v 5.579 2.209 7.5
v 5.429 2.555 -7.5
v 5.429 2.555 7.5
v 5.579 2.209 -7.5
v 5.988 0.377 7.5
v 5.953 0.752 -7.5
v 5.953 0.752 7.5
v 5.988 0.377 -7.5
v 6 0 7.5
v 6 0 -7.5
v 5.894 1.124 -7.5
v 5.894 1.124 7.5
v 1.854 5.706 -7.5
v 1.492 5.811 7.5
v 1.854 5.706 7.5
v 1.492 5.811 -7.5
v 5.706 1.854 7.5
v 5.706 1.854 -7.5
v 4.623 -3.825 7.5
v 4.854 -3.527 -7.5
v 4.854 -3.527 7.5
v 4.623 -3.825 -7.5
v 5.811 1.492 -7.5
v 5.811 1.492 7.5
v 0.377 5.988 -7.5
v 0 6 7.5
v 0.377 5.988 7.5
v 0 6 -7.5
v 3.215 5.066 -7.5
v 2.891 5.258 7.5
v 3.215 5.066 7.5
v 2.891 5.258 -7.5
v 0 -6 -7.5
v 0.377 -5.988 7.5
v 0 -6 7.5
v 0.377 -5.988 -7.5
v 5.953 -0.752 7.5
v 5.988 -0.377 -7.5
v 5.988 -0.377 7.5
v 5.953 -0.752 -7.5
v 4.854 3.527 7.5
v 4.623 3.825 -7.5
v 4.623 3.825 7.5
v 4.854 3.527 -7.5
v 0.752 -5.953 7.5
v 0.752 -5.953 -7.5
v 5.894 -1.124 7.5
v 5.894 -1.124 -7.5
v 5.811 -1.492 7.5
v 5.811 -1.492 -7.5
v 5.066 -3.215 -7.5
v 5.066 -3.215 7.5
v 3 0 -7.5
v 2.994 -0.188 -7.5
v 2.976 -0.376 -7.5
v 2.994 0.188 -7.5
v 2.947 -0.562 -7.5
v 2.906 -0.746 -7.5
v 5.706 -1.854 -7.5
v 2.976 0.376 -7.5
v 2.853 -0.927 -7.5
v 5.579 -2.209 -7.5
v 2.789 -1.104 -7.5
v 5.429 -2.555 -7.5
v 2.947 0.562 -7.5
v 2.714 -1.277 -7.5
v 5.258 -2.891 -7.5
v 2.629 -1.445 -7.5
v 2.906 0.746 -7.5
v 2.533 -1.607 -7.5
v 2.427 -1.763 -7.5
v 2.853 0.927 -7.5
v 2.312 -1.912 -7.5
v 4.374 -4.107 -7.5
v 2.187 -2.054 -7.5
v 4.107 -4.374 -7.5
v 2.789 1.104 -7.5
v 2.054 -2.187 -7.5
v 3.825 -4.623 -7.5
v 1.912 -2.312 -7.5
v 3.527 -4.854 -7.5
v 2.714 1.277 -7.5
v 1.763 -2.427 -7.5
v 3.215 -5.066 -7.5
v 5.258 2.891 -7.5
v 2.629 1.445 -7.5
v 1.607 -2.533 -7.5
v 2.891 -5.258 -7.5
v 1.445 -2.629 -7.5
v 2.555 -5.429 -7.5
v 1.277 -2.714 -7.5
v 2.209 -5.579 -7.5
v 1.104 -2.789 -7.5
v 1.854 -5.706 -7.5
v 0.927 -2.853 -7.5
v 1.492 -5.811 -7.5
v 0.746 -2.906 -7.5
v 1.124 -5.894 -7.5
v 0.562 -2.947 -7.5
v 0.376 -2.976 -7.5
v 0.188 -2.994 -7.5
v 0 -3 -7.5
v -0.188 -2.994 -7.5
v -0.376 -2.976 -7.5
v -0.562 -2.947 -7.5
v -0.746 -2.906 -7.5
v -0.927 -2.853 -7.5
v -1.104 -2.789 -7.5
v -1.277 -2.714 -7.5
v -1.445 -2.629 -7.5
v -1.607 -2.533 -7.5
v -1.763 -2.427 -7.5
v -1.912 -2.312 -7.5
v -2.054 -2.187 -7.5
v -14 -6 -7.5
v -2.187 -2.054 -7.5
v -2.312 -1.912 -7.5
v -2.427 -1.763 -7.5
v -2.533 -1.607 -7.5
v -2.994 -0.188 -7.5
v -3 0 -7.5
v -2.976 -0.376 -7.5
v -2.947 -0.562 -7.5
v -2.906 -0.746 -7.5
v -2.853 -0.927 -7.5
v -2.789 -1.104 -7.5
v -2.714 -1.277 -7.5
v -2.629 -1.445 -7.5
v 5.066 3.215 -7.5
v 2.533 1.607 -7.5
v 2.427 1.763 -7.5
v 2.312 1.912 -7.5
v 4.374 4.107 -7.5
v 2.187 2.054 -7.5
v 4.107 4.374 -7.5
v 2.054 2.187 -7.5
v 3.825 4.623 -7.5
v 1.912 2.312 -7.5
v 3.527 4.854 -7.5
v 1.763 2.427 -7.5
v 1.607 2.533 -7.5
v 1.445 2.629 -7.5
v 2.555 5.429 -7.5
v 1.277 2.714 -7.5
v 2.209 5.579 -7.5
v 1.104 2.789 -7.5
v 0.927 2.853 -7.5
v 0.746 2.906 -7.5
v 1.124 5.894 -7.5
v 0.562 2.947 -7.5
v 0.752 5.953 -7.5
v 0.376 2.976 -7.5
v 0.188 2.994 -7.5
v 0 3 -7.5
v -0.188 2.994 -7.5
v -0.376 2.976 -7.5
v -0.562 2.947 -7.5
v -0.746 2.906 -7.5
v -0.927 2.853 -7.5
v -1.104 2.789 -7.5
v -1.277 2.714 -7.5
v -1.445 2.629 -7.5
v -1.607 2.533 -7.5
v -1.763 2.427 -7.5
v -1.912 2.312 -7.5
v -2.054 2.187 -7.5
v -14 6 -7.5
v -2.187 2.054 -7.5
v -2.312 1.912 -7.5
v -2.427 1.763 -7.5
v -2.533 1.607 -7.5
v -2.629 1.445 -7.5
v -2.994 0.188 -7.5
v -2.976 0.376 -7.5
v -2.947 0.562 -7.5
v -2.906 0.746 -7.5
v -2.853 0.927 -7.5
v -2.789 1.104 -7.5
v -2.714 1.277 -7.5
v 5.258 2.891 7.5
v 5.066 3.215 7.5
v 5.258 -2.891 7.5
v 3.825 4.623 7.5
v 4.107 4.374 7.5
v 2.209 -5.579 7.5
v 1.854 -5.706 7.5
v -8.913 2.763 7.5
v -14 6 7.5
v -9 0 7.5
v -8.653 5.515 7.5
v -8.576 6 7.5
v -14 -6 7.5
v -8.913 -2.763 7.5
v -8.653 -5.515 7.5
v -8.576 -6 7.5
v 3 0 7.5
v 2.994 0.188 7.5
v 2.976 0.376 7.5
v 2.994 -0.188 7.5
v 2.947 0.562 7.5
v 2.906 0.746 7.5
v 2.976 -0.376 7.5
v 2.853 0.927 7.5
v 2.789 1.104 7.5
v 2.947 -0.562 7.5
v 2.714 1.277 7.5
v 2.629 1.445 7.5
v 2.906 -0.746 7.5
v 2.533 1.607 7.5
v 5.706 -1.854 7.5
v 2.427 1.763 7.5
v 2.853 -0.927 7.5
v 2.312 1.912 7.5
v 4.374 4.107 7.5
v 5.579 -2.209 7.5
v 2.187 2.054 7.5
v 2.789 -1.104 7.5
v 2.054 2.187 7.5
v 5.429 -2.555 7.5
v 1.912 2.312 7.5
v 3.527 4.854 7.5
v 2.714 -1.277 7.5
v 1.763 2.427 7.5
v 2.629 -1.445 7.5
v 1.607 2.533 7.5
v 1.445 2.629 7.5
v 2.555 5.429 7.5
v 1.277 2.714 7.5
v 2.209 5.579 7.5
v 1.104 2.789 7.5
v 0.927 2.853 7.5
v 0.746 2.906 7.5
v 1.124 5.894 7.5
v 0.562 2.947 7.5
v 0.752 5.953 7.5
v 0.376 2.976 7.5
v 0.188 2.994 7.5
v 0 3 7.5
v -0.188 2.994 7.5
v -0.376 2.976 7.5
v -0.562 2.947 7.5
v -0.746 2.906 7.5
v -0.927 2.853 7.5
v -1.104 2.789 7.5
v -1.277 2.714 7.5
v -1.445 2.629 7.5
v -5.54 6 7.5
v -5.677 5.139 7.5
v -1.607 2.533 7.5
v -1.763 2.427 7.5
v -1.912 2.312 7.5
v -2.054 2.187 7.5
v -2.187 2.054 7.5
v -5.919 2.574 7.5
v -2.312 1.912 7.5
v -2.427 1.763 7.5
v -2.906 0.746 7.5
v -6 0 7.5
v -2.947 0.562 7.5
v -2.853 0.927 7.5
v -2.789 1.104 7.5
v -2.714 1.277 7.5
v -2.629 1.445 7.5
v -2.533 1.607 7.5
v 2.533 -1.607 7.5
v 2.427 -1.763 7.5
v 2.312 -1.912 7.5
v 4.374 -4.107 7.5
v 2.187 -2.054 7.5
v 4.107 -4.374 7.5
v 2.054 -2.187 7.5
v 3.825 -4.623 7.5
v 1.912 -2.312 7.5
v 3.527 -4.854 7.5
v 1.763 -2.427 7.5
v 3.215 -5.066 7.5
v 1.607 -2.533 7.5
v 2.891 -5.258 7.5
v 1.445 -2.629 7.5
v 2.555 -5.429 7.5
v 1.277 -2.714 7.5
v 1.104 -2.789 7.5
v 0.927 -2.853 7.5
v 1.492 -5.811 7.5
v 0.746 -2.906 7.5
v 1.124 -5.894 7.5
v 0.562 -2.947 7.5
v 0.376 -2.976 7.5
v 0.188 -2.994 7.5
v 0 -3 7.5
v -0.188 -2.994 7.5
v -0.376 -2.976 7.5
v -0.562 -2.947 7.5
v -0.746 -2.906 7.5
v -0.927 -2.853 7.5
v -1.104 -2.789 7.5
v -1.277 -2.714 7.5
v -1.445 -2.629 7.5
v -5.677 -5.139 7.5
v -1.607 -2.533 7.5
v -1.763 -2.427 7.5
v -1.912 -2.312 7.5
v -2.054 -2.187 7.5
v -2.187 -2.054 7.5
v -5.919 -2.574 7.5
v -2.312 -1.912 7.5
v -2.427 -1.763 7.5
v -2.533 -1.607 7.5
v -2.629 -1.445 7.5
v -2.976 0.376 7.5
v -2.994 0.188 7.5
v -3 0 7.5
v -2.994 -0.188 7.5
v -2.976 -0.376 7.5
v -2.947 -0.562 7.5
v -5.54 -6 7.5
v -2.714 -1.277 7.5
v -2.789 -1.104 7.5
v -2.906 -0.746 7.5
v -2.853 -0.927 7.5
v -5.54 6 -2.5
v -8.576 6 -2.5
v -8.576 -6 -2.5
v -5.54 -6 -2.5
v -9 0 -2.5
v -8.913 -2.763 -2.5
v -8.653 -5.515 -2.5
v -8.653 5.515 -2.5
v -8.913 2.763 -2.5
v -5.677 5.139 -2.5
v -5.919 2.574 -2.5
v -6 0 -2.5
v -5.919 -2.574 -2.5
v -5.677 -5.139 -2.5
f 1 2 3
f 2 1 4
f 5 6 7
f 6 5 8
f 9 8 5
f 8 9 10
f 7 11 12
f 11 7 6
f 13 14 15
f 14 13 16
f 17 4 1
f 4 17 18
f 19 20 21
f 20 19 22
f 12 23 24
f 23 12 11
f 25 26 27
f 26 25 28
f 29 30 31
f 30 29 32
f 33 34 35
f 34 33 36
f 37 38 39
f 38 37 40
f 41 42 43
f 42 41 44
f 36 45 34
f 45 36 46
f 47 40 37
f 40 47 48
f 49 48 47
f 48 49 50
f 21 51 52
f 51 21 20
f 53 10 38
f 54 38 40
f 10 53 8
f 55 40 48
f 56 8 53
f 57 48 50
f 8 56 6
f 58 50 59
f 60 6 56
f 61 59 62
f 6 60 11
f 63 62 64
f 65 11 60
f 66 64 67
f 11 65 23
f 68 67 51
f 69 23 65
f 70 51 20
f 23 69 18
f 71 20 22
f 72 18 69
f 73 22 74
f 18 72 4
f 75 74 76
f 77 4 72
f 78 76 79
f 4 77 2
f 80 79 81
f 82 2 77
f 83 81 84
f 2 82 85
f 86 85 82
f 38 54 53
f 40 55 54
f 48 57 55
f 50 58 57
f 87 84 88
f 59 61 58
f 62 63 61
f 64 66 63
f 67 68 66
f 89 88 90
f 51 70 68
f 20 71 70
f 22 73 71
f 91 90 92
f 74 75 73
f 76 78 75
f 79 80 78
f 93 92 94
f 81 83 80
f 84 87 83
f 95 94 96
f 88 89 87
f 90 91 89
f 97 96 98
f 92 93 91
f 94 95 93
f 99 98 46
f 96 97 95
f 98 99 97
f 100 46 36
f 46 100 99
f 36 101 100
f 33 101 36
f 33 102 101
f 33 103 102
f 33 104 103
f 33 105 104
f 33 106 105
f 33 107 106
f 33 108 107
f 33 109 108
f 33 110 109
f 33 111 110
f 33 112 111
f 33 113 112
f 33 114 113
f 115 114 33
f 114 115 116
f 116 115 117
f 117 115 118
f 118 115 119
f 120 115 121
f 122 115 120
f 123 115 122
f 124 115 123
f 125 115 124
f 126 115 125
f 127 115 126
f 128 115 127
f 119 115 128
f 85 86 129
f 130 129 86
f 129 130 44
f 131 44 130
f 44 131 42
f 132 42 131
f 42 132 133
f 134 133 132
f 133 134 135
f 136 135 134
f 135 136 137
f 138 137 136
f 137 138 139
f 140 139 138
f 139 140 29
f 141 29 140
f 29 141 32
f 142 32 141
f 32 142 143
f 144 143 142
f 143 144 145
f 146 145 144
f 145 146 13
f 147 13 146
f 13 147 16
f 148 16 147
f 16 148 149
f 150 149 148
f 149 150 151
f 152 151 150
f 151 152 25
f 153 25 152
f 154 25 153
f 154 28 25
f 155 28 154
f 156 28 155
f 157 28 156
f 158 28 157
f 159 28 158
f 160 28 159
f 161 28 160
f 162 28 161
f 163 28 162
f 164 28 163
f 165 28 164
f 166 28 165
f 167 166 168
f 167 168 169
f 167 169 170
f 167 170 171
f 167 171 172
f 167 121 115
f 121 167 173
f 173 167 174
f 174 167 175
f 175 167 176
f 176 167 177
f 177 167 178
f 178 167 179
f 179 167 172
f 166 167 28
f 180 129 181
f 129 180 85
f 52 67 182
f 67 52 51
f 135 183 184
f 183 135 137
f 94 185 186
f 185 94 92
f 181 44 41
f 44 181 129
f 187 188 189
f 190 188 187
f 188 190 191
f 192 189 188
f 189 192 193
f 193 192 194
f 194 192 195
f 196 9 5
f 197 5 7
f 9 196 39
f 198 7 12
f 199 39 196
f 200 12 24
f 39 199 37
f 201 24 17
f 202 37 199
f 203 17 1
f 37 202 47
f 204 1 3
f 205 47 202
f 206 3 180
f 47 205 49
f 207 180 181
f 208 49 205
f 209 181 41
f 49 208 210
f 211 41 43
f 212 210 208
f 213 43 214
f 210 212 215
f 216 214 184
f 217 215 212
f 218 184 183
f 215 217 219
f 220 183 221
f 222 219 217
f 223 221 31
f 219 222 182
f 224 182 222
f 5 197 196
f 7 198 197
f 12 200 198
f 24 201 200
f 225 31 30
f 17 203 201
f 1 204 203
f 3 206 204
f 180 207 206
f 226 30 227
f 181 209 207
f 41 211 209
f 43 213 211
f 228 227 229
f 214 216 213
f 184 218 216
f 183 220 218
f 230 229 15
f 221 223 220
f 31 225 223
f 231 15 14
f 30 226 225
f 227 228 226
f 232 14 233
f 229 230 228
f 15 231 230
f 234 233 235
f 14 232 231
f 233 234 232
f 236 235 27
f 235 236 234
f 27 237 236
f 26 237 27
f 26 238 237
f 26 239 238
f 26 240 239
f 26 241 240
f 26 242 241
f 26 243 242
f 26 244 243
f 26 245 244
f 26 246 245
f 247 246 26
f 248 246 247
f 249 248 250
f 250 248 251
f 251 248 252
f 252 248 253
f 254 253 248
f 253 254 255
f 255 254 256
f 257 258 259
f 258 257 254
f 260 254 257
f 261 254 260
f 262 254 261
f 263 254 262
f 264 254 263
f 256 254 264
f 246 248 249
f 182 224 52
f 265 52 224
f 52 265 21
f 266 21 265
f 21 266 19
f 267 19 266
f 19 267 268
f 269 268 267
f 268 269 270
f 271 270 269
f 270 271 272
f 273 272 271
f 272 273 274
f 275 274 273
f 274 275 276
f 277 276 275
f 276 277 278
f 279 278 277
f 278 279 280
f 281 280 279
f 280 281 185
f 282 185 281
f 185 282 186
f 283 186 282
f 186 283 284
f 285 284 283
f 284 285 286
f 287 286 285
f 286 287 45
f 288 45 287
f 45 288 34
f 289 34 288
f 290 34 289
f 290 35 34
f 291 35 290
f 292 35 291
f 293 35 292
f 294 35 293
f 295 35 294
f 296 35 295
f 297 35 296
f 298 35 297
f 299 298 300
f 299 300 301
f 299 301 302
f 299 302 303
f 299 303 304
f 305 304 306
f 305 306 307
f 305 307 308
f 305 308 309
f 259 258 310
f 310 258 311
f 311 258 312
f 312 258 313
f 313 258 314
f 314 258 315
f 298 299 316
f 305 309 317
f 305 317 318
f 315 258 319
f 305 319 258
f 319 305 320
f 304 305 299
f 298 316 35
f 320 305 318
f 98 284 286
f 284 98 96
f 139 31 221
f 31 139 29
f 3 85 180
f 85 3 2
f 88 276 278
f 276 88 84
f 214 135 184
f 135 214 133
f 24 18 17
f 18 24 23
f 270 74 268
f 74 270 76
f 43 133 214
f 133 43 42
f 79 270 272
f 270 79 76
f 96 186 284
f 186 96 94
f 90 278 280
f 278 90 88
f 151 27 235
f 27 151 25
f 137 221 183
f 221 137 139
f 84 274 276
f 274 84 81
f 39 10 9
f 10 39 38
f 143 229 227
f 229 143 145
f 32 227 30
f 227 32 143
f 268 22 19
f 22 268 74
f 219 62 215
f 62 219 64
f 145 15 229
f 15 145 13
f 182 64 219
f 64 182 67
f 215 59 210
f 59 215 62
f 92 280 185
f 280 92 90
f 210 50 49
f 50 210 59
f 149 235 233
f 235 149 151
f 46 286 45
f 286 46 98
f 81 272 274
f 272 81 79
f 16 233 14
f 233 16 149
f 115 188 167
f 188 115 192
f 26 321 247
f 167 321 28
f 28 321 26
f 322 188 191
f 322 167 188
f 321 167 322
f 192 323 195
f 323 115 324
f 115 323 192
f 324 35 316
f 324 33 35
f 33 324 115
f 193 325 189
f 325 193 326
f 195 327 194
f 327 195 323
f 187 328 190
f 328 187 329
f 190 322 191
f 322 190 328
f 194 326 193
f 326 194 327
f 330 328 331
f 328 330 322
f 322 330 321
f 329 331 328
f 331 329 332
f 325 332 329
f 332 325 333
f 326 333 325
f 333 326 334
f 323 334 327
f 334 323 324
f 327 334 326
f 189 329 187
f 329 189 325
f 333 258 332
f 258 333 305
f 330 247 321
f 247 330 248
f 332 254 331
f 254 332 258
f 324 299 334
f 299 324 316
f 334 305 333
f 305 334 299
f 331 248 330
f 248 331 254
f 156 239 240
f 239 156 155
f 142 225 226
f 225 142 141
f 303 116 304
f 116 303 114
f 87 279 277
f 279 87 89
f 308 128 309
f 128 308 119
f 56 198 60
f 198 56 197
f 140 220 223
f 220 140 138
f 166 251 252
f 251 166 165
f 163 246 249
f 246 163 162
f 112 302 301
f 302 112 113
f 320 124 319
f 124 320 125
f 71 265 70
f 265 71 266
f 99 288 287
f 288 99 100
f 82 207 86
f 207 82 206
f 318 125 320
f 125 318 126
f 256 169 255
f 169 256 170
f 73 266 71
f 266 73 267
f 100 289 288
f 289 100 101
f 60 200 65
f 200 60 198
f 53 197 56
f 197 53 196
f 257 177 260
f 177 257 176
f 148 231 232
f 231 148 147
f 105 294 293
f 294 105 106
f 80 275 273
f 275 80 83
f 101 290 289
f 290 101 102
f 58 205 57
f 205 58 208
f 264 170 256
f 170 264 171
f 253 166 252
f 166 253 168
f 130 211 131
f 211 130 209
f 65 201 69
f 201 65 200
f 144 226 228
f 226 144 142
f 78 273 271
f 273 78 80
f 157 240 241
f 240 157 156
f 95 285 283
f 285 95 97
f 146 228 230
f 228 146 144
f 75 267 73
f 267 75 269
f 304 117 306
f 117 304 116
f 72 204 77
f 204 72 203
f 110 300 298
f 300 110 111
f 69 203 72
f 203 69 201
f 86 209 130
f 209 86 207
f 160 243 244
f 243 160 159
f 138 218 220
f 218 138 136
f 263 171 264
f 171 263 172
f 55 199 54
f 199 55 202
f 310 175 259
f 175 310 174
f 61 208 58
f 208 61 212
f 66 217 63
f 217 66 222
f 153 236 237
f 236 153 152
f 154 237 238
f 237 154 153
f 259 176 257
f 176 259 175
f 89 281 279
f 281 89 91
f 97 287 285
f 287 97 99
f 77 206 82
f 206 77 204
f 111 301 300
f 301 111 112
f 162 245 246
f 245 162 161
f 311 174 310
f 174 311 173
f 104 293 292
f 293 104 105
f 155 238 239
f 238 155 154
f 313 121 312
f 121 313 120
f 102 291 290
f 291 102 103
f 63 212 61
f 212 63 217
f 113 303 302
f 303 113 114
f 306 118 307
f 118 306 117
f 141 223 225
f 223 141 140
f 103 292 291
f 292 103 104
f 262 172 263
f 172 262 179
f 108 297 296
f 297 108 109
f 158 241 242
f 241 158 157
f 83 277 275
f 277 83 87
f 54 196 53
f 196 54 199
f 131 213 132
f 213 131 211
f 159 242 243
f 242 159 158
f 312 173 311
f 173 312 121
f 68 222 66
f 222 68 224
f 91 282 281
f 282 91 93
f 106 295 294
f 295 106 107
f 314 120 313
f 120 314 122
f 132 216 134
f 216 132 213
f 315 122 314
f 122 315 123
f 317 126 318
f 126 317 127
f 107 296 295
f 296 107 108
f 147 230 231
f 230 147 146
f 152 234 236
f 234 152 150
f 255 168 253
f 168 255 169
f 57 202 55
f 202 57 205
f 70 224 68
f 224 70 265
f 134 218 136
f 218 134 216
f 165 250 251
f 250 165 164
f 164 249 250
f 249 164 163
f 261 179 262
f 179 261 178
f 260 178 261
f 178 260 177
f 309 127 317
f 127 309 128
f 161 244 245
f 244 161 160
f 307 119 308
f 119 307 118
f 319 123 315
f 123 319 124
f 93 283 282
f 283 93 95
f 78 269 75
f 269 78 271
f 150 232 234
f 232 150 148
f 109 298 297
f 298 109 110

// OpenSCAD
// Written by Volksswitch <www.volksswitch.org> 
// based on the Straw Holder design by NoHands: https://www.thingiverse.com/thing:1953484
// 
// To the extent possible under law, the author(s) have dedicated all
// copyright and related and neighboring rights to this software to the
// public domain worldwide. This software is distributed without any
// warranty.
//
// You should have received a copy of the CC0 Public Domain
// Dedication along with this software.
// If not, see <http://creativecommons.org/publicdomain/zero/1.0/>.
//


//------------------------------------------------------------------
// User Inputs
//------------------------------------------------------------------

/*[Parameters]*/
straw_diameter = 6;
straw_holder_height = 15;
cup_diameter=88;
cup_wall_thickness=3;

/*[Hidden]*/
straw_dia = straw_diameter;
straw_radius=straw_dia/2;
straw_wall=3;
cup_radius=cup_diameter/2;
tab_length=straw_radius+straw_wall+cup_wall_thickness+5;
$fn=100;

difference(){

	union(){
		cylinder(r=straw_radius+straw_wall,h=straw_holder_height,center=true);
		translate([-tab_length/2,0,0])
		cube([tab_length,straw_dia+2*straw_wall,straw_holder_height],center=true);
	}

	cylinder(r=straw_radius,h=straw_holder_height+0.05,center=true);

	difference(){
		translate([cup_radius-straw_radius-straw_wall-cup_wall_thickness,0,5])
		cylinder(r=cup_radius,h=straw_holder_height,center=true);
		translate([cup_radius-straw_radius-straw_wall-cup_wall_thickness,0,5])
		cylinder(r=cup_radius-cup_wall_thickness,h=straw_holder_height+0.05,center=true);
	}
}
